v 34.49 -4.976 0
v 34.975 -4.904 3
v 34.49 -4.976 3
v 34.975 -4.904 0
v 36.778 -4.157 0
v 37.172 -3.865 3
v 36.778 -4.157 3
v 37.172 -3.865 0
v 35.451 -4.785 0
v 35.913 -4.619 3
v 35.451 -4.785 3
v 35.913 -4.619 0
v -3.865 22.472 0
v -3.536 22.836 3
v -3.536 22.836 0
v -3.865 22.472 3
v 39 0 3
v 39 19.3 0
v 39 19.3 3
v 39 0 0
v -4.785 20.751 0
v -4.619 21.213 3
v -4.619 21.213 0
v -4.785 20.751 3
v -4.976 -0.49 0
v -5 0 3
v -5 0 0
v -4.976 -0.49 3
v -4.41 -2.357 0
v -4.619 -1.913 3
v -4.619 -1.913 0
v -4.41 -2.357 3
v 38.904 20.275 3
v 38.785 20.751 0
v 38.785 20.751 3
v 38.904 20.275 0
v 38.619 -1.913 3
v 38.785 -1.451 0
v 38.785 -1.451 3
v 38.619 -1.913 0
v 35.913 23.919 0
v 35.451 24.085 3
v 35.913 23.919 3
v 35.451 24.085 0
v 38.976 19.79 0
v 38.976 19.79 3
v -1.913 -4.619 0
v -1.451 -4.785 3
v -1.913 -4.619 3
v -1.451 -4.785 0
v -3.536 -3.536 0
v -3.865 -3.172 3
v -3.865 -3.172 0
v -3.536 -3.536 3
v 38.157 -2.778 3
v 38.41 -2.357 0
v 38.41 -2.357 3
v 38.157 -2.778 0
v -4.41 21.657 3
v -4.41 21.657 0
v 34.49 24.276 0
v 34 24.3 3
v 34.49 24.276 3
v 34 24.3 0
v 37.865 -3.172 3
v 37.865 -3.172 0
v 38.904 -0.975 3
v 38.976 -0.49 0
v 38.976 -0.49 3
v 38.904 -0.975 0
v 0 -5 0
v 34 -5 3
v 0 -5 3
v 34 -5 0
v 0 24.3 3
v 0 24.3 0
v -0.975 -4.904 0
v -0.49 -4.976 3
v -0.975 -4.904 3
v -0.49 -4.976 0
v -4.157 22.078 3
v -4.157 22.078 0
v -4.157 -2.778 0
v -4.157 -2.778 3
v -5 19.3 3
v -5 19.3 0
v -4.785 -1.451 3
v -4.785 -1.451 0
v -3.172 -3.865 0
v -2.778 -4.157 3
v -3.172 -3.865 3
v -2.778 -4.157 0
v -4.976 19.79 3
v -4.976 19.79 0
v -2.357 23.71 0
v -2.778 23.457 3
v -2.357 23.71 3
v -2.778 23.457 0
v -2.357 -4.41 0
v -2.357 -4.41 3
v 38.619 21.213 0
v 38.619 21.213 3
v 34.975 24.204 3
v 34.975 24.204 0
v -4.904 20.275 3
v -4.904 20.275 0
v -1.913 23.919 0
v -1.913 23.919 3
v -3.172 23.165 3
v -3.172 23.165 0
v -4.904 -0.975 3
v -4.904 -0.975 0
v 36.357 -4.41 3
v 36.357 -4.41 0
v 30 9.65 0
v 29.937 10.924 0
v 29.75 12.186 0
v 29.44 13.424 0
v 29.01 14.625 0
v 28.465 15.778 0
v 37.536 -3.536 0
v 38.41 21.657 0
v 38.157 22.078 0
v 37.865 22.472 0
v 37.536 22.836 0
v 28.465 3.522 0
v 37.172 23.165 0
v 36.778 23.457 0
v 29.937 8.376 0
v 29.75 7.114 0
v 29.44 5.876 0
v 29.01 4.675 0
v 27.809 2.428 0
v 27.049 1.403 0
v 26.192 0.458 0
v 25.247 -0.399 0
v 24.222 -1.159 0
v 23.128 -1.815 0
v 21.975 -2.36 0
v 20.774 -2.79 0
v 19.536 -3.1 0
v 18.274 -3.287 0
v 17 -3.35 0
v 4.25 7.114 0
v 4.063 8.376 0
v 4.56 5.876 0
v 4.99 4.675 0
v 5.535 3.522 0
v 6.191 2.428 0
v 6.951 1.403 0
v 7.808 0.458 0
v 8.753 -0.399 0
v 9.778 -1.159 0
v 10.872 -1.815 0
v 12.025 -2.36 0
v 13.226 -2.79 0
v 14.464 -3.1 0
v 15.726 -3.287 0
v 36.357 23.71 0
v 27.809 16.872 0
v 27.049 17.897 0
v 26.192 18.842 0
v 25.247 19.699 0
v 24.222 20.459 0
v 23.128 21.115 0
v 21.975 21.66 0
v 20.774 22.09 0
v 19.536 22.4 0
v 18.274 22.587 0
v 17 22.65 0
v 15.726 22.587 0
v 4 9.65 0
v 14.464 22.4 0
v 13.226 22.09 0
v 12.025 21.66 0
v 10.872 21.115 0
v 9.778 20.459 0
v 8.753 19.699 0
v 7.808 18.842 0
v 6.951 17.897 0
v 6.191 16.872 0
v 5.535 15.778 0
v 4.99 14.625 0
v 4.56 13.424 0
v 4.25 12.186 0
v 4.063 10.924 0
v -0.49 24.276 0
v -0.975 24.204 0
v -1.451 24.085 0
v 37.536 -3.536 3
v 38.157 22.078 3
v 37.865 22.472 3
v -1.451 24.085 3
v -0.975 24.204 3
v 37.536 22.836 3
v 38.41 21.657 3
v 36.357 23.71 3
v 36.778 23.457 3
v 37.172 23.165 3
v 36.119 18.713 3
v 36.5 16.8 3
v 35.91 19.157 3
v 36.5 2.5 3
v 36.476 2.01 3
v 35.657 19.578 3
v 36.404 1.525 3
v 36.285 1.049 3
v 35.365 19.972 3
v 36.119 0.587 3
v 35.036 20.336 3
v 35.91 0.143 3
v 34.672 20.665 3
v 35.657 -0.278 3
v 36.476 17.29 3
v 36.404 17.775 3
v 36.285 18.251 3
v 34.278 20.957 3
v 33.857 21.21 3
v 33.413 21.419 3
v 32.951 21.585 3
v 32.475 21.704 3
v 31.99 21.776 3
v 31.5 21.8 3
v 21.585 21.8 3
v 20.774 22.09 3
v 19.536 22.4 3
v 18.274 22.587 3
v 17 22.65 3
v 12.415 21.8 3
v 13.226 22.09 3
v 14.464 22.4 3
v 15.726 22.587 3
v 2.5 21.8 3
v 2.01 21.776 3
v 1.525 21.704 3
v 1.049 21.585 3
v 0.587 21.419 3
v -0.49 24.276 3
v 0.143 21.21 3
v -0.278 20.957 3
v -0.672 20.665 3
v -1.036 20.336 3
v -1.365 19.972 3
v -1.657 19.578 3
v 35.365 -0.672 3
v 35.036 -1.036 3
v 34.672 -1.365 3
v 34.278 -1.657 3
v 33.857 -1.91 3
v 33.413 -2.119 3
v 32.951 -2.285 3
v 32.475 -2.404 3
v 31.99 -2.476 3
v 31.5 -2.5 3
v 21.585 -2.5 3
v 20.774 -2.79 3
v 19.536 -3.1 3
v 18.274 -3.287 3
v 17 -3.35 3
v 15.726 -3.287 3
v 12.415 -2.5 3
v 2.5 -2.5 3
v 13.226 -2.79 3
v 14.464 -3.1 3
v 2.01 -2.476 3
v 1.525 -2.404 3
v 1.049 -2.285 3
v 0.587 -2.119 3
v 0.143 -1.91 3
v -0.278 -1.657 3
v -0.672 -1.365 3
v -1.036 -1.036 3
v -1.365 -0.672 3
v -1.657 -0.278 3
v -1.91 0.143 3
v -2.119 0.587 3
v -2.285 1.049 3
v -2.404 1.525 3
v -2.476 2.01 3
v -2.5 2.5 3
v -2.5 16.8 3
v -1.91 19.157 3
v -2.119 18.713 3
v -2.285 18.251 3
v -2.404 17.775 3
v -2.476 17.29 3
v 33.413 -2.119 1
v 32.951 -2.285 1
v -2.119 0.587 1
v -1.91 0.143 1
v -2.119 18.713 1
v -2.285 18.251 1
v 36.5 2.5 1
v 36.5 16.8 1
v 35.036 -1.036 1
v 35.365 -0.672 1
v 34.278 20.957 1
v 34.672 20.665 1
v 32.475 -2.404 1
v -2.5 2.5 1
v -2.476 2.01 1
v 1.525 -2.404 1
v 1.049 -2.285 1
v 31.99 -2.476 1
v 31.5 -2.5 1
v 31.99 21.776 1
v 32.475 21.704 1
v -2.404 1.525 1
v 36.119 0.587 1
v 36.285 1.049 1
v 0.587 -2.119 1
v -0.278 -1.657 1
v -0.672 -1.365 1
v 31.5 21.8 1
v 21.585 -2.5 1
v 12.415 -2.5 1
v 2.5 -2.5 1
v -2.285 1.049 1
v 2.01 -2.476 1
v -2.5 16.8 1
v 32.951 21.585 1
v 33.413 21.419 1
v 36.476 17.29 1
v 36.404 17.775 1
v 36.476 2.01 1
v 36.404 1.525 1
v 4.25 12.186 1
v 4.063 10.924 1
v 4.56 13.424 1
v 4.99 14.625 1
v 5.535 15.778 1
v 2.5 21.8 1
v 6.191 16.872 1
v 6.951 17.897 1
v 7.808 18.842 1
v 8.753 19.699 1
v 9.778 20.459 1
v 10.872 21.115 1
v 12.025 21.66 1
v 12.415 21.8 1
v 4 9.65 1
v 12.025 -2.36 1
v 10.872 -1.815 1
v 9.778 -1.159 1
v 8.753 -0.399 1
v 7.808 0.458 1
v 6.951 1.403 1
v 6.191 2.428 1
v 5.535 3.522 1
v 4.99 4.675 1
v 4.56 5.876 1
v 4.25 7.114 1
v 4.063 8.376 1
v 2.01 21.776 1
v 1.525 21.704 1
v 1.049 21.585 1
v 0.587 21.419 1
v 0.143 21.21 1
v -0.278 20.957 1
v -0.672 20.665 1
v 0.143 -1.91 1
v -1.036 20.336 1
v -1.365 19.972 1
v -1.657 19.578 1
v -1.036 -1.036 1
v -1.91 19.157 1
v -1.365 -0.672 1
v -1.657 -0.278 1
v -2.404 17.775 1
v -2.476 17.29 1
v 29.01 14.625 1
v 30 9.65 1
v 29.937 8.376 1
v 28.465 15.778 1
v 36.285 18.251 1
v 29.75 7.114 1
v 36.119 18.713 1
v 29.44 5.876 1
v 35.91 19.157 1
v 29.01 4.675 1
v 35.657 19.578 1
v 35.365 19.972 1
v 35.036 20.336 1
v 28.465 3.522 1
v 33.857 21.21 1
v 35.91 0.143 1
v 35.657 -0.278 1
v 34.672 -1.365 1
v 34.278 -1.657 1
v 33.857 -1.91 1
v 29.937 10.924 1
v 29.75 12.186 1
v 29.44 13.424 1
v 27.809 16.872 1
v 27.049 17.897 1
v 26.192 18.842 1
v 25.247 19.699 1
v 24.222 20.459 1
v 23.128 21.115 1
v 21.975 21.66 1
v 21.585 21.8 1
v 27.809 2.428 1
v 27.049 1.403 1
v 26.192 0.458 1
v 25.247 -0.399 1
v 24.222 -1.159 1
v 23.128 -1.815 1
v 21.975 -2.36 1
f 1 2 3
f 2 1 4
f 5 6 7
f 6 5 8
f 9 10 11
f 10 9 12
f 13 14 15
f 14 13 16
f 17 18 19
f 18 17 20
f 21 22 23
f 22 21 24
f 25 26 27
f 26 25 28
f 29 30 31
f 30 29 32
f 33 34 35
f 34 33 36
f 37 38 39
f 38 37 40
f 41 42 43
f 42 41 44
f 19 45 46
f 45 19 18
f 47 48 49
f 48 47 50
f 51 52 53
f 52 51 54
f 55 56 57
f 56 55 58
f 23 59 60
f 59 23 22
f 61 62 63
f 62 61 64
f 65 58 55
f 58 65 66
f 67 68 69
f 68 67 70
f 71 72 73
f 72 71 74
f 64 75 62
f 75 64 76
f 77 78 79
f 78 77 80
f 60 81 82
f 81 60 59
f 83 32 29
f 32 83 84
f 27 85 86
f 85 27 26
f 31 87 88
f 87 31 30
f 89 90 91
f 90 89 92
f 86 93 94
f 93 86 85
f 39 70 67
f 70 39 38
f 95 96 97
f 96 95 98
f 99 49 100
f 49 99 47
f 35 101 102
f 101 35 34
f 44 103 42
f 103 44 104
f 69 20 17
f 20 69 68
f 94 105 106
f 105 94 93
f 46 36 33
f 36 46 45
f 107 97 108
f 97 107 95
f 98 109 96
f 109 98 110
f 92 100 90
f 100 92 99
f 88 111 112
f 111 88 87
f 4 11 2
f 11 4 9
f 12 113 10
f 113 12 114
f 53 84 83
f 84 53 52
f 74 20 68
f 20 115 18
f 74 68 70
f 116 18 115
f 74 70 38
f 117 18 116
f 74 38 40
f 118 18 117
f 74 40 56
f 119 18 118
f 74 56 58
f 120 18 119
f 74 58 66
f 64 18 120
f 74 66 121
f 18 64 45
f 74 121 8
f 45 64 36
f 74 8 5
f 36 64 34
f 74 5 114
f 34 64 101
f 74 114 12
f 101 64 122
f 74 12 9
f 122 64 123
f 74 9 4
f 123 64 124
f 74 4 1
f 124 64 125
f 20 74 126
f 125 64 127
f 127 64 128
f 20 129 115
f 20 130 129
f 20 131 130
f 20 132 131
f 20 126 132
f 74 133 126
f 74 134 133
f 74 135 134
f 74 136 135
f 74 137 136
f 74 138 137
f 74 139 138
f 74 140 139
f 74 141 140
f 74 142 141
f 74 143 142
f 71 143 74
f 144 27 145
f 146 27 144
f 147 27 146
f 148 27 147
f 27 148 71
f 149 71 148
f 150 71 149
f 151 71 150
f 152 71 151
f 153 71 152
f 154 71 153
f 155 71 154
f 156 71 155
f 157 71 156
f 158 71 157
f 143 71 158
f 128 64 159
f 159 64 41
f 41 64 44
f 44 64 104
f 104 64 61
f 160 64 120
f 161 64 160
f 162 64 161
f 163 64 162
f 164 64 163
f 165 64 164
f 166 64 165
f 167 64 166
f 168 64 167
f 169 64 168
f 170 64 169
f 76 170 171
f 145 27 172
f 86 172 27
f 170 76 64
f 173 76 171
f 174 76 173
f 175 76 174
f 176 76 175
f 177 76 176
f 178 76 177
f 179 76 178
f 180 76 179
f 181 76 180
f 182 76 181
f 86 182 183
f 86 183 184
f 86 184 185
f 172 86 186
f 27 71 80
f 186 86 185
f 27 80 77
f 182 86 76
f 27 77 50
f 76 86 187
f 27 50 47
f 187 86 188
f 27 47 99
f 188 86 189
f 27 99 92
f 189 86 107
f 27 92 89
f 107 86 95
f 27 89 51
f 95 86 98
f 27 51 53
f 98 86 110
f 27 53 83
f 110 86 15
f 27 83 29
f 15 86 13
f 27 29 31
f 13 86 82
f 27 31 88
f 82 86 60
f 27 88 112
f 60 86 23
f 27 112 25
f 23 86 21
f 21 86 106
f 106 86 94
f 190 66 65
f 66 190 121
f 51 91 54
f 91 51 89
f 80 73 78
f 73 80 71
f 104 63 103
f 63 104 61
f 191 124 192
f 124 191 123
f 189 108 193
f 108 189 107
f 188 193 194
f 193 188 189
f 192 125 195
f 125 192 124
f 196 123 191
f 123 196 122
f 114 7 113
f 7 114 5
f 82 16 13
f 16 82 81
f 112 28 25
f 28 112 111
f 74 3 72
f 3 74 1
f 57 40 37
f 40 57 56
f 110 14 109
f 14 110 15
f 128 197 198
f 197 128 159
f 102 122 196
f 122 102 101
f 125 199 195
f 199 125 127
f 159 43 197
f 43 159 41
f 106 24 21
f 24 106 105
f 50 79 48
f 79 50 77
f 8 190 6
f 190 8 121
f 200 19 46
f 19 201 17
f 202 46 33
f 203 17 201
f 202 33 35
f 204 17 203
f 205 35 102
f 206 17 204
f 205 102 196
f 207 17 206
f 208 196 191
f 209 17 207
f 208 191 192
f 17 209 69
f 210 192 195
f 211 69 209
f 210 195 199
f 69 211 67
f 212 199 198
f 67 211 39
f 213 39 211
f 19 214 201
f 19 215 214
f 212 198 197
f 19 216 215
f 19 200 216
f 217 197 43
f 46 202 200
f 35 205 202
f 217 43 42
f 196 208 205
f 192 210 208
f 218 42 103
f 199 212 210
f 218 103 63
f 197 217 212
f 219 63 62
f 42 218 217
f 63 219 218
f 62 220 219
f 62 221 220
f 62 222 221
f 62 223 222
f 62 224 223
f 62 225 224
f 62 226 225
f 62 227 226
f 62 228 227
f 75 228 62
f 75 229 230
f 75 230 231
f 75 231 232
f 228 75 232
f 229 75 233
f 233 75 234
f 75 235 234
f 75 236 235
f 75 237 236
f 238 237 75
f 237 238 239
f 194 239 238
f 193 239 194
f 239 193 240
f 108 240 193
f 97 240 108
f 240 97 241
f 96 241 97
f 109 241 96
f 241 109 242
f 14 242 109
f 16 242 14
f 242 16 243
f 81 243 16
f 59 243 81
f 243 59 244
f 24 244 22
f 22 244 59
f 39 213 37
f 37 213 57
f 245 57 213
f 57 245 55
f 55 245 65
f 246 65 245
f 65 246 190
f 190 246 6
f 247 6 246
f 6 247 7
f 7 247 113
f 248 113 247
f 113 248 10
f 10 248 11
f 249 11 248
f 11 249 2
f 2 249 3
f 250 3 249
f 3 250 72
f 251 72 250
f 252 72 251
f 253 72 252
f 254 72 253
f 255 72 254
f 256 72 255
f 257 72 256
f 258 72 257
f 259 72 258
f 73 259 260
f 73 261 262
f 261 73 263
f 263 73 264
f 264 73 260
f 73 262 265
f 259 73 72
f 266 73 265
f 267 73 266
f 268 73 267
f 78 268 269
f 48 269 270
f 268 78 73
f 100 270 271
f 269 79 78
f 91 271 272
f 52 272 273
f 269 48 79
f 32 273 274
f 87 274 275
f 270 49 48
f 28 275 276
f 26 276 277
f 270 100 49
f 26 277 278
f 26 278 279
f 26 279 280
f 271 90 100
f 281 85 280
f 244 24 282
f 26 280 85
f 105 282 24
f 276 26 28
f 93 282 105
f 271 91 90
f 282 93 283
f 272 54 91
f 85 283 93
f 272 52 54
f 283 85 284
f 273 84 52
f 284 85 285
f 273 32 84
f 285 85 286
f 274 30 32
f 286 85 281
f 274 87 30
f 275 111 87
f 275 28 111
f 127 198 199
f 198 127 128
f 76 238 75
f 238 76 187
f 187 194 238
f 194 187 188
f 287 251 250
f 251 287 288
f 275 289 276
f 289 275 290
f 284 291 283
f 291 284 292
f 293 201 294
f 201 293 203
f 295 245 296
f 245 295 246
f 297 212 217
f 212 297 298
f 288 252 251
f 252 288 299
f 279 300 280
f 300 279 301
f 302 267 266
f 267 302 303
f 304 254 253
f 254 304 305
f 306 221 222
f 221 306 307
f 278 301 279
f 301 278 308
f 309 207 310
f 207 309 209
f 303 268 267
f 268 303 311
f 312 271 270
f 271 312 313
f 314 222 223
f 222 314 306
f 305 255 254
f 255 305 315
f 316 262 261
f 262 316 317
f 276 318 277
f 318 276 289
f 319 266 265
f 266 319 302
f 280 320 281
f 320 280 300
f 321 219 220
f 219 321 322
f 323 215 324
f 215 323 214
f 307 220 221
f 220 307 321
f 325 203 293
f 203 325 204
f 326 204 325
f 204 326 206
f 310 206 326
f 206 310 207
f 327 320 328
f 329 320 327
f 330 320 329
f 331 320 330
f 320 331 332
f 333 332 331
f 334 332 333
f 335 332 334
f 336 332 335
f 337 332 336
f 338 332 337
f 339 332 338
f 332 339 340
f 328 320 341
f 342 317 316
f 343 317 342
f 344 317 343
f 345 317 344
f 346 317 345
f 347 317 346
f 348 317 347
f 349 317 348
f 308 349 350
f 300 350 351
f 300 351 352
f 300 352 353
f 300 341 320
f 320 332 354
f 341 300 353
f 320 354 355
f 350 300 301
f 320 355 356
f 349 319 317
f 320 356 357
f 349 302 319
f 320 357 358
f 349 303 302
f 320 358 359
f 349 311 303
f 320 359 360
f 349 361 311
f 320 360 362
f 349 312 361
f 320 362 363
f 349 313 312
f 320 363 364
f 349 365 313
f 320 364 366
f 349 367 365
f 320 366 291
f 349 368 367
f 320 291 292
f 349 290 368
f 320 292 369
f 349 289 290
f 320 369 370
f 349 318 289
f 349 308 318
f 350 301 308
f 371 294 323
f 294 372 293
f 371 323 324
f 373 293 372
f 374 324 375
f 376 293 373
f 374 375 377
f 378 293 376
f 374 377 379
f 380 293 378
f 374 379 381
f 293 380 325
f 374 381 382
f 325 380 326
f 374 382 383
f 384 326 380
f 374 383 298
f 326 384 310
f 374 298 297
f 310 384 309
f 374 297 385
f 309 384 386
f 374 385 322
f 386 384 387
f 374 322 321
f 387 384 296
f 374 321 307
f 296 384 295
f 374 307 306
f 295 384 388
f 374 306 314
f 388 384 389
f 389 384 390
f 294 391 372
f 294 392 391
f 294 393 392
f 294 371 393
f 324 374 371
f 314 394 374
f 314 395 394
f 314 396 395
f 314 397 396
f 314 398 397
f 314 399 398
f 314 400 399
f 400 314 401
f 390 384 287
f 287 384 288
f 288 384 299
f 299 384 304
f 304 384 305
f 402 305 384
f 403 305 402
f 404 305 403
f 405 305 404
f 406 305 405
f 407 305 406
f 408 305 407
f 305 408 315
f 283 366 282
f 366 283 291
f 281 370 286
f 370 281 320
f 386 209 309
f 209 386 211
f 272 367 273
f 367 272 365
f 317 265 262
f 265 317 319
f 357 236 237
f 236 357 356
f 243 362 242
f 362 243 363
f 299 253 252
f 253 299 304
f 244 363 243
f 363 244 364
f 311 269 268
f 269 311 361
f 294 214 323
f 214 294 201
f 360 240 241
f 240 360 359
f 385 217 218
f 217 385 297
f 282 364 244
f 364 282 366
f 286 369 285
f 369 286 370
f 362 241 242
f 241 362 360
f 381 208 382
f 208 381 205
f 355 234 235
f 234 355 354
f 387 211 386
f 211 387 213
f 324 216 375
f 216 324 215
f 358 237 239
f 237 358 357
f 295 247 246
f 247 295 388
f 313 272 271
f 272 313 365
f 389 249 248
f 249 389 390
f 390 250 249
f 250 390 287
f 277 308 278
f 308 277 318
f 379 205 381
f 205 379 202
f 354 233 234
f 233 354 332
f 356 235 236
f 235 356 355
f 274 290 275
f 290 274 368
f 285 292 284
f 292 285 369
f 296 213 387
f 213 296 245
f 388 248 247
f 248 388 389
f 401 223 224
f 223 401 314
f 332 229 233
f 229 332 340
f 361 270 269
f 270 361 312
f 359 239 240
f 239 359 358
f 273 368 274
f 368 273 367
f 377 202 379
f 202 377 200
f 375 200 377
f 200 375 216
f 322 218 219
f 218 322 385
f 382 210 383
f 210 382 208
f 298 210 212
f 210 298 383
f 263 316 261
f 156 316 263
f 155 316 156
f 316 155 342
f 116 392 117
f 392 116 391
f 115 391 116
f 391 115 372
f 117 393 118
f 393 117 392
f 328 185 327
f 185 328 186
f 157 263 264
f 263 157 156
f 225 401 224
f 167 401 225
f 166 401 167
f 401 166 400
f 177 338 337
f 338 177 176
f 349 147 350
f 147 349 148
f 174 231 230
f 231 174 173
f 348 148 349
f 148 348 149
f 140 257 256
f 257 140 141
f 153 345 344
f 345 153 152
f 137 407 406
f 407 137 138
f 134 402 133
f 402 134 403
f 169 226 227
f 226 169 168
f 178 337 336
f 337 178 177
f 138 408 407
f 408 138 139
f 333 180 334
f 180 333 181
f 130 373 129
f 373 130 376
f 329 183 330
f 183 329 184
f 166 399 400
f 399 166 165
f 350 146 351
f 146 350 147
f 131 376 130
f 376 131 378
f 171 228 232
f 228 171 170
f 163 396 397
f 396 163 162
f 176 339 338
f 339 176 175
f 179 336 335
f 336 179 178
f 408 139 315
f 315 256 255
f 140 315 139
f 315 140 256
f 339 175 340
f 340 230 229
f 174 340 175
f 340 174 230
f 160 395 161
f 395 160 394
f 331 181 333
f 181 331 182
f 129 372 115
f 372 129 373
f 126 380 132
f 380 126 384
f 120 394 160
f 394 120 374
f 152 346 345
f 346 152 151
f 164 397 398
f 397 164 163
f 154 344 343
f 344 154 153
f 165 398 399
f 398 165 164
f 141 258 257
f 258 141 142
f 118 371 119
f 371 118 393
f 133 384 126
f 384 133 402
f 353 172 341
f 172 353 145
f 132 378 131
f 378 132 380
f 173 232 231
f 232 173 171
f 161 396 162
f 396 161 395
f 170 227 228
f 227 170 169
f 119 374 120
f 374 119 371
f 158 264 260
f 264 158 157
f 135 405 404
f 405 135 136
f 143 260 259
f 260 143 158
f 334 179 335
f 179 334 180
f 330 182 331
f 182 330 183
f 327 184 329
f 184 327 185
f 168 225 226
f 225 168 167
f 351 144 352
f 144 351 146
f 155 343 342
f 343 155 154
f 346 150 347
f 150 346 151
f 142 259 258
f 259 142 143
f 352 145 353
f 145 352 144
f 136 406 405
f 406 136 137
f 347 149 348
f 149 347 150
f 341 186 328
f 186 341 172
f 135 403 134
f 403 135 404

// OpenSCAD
$fn=64;
corner_radius=5;
height=3;
plate_height=1;
plate_length=44;
plate_width=29.3;
wall_thickness=5;

rotator_mount_diameter=26;

center_x=plate_length/2-corner_radius;
center_y=plate_width/2-corner_radius;

difference() {
    minkowski() {
        cube([plate_length-2 * corner_radius, plate_width-2 * corner_radius, height/2]);
        cylinder(r=corner_radius, h=height/2);
    }
    minkowski() {
        translate([corner_radius/2,corner_radius/2,plate_height]) cube([plate_length-2 * corner_radius - wall_thickness, plate_width-2 * corner_radius - wall_thickness, height/2]);
        cylinder(r=corner_radius, h=height/2);
    }
    translate([center_x,center_y,-1]) cylinder(h=2*height, d=rotator_mount_diameter);
}
